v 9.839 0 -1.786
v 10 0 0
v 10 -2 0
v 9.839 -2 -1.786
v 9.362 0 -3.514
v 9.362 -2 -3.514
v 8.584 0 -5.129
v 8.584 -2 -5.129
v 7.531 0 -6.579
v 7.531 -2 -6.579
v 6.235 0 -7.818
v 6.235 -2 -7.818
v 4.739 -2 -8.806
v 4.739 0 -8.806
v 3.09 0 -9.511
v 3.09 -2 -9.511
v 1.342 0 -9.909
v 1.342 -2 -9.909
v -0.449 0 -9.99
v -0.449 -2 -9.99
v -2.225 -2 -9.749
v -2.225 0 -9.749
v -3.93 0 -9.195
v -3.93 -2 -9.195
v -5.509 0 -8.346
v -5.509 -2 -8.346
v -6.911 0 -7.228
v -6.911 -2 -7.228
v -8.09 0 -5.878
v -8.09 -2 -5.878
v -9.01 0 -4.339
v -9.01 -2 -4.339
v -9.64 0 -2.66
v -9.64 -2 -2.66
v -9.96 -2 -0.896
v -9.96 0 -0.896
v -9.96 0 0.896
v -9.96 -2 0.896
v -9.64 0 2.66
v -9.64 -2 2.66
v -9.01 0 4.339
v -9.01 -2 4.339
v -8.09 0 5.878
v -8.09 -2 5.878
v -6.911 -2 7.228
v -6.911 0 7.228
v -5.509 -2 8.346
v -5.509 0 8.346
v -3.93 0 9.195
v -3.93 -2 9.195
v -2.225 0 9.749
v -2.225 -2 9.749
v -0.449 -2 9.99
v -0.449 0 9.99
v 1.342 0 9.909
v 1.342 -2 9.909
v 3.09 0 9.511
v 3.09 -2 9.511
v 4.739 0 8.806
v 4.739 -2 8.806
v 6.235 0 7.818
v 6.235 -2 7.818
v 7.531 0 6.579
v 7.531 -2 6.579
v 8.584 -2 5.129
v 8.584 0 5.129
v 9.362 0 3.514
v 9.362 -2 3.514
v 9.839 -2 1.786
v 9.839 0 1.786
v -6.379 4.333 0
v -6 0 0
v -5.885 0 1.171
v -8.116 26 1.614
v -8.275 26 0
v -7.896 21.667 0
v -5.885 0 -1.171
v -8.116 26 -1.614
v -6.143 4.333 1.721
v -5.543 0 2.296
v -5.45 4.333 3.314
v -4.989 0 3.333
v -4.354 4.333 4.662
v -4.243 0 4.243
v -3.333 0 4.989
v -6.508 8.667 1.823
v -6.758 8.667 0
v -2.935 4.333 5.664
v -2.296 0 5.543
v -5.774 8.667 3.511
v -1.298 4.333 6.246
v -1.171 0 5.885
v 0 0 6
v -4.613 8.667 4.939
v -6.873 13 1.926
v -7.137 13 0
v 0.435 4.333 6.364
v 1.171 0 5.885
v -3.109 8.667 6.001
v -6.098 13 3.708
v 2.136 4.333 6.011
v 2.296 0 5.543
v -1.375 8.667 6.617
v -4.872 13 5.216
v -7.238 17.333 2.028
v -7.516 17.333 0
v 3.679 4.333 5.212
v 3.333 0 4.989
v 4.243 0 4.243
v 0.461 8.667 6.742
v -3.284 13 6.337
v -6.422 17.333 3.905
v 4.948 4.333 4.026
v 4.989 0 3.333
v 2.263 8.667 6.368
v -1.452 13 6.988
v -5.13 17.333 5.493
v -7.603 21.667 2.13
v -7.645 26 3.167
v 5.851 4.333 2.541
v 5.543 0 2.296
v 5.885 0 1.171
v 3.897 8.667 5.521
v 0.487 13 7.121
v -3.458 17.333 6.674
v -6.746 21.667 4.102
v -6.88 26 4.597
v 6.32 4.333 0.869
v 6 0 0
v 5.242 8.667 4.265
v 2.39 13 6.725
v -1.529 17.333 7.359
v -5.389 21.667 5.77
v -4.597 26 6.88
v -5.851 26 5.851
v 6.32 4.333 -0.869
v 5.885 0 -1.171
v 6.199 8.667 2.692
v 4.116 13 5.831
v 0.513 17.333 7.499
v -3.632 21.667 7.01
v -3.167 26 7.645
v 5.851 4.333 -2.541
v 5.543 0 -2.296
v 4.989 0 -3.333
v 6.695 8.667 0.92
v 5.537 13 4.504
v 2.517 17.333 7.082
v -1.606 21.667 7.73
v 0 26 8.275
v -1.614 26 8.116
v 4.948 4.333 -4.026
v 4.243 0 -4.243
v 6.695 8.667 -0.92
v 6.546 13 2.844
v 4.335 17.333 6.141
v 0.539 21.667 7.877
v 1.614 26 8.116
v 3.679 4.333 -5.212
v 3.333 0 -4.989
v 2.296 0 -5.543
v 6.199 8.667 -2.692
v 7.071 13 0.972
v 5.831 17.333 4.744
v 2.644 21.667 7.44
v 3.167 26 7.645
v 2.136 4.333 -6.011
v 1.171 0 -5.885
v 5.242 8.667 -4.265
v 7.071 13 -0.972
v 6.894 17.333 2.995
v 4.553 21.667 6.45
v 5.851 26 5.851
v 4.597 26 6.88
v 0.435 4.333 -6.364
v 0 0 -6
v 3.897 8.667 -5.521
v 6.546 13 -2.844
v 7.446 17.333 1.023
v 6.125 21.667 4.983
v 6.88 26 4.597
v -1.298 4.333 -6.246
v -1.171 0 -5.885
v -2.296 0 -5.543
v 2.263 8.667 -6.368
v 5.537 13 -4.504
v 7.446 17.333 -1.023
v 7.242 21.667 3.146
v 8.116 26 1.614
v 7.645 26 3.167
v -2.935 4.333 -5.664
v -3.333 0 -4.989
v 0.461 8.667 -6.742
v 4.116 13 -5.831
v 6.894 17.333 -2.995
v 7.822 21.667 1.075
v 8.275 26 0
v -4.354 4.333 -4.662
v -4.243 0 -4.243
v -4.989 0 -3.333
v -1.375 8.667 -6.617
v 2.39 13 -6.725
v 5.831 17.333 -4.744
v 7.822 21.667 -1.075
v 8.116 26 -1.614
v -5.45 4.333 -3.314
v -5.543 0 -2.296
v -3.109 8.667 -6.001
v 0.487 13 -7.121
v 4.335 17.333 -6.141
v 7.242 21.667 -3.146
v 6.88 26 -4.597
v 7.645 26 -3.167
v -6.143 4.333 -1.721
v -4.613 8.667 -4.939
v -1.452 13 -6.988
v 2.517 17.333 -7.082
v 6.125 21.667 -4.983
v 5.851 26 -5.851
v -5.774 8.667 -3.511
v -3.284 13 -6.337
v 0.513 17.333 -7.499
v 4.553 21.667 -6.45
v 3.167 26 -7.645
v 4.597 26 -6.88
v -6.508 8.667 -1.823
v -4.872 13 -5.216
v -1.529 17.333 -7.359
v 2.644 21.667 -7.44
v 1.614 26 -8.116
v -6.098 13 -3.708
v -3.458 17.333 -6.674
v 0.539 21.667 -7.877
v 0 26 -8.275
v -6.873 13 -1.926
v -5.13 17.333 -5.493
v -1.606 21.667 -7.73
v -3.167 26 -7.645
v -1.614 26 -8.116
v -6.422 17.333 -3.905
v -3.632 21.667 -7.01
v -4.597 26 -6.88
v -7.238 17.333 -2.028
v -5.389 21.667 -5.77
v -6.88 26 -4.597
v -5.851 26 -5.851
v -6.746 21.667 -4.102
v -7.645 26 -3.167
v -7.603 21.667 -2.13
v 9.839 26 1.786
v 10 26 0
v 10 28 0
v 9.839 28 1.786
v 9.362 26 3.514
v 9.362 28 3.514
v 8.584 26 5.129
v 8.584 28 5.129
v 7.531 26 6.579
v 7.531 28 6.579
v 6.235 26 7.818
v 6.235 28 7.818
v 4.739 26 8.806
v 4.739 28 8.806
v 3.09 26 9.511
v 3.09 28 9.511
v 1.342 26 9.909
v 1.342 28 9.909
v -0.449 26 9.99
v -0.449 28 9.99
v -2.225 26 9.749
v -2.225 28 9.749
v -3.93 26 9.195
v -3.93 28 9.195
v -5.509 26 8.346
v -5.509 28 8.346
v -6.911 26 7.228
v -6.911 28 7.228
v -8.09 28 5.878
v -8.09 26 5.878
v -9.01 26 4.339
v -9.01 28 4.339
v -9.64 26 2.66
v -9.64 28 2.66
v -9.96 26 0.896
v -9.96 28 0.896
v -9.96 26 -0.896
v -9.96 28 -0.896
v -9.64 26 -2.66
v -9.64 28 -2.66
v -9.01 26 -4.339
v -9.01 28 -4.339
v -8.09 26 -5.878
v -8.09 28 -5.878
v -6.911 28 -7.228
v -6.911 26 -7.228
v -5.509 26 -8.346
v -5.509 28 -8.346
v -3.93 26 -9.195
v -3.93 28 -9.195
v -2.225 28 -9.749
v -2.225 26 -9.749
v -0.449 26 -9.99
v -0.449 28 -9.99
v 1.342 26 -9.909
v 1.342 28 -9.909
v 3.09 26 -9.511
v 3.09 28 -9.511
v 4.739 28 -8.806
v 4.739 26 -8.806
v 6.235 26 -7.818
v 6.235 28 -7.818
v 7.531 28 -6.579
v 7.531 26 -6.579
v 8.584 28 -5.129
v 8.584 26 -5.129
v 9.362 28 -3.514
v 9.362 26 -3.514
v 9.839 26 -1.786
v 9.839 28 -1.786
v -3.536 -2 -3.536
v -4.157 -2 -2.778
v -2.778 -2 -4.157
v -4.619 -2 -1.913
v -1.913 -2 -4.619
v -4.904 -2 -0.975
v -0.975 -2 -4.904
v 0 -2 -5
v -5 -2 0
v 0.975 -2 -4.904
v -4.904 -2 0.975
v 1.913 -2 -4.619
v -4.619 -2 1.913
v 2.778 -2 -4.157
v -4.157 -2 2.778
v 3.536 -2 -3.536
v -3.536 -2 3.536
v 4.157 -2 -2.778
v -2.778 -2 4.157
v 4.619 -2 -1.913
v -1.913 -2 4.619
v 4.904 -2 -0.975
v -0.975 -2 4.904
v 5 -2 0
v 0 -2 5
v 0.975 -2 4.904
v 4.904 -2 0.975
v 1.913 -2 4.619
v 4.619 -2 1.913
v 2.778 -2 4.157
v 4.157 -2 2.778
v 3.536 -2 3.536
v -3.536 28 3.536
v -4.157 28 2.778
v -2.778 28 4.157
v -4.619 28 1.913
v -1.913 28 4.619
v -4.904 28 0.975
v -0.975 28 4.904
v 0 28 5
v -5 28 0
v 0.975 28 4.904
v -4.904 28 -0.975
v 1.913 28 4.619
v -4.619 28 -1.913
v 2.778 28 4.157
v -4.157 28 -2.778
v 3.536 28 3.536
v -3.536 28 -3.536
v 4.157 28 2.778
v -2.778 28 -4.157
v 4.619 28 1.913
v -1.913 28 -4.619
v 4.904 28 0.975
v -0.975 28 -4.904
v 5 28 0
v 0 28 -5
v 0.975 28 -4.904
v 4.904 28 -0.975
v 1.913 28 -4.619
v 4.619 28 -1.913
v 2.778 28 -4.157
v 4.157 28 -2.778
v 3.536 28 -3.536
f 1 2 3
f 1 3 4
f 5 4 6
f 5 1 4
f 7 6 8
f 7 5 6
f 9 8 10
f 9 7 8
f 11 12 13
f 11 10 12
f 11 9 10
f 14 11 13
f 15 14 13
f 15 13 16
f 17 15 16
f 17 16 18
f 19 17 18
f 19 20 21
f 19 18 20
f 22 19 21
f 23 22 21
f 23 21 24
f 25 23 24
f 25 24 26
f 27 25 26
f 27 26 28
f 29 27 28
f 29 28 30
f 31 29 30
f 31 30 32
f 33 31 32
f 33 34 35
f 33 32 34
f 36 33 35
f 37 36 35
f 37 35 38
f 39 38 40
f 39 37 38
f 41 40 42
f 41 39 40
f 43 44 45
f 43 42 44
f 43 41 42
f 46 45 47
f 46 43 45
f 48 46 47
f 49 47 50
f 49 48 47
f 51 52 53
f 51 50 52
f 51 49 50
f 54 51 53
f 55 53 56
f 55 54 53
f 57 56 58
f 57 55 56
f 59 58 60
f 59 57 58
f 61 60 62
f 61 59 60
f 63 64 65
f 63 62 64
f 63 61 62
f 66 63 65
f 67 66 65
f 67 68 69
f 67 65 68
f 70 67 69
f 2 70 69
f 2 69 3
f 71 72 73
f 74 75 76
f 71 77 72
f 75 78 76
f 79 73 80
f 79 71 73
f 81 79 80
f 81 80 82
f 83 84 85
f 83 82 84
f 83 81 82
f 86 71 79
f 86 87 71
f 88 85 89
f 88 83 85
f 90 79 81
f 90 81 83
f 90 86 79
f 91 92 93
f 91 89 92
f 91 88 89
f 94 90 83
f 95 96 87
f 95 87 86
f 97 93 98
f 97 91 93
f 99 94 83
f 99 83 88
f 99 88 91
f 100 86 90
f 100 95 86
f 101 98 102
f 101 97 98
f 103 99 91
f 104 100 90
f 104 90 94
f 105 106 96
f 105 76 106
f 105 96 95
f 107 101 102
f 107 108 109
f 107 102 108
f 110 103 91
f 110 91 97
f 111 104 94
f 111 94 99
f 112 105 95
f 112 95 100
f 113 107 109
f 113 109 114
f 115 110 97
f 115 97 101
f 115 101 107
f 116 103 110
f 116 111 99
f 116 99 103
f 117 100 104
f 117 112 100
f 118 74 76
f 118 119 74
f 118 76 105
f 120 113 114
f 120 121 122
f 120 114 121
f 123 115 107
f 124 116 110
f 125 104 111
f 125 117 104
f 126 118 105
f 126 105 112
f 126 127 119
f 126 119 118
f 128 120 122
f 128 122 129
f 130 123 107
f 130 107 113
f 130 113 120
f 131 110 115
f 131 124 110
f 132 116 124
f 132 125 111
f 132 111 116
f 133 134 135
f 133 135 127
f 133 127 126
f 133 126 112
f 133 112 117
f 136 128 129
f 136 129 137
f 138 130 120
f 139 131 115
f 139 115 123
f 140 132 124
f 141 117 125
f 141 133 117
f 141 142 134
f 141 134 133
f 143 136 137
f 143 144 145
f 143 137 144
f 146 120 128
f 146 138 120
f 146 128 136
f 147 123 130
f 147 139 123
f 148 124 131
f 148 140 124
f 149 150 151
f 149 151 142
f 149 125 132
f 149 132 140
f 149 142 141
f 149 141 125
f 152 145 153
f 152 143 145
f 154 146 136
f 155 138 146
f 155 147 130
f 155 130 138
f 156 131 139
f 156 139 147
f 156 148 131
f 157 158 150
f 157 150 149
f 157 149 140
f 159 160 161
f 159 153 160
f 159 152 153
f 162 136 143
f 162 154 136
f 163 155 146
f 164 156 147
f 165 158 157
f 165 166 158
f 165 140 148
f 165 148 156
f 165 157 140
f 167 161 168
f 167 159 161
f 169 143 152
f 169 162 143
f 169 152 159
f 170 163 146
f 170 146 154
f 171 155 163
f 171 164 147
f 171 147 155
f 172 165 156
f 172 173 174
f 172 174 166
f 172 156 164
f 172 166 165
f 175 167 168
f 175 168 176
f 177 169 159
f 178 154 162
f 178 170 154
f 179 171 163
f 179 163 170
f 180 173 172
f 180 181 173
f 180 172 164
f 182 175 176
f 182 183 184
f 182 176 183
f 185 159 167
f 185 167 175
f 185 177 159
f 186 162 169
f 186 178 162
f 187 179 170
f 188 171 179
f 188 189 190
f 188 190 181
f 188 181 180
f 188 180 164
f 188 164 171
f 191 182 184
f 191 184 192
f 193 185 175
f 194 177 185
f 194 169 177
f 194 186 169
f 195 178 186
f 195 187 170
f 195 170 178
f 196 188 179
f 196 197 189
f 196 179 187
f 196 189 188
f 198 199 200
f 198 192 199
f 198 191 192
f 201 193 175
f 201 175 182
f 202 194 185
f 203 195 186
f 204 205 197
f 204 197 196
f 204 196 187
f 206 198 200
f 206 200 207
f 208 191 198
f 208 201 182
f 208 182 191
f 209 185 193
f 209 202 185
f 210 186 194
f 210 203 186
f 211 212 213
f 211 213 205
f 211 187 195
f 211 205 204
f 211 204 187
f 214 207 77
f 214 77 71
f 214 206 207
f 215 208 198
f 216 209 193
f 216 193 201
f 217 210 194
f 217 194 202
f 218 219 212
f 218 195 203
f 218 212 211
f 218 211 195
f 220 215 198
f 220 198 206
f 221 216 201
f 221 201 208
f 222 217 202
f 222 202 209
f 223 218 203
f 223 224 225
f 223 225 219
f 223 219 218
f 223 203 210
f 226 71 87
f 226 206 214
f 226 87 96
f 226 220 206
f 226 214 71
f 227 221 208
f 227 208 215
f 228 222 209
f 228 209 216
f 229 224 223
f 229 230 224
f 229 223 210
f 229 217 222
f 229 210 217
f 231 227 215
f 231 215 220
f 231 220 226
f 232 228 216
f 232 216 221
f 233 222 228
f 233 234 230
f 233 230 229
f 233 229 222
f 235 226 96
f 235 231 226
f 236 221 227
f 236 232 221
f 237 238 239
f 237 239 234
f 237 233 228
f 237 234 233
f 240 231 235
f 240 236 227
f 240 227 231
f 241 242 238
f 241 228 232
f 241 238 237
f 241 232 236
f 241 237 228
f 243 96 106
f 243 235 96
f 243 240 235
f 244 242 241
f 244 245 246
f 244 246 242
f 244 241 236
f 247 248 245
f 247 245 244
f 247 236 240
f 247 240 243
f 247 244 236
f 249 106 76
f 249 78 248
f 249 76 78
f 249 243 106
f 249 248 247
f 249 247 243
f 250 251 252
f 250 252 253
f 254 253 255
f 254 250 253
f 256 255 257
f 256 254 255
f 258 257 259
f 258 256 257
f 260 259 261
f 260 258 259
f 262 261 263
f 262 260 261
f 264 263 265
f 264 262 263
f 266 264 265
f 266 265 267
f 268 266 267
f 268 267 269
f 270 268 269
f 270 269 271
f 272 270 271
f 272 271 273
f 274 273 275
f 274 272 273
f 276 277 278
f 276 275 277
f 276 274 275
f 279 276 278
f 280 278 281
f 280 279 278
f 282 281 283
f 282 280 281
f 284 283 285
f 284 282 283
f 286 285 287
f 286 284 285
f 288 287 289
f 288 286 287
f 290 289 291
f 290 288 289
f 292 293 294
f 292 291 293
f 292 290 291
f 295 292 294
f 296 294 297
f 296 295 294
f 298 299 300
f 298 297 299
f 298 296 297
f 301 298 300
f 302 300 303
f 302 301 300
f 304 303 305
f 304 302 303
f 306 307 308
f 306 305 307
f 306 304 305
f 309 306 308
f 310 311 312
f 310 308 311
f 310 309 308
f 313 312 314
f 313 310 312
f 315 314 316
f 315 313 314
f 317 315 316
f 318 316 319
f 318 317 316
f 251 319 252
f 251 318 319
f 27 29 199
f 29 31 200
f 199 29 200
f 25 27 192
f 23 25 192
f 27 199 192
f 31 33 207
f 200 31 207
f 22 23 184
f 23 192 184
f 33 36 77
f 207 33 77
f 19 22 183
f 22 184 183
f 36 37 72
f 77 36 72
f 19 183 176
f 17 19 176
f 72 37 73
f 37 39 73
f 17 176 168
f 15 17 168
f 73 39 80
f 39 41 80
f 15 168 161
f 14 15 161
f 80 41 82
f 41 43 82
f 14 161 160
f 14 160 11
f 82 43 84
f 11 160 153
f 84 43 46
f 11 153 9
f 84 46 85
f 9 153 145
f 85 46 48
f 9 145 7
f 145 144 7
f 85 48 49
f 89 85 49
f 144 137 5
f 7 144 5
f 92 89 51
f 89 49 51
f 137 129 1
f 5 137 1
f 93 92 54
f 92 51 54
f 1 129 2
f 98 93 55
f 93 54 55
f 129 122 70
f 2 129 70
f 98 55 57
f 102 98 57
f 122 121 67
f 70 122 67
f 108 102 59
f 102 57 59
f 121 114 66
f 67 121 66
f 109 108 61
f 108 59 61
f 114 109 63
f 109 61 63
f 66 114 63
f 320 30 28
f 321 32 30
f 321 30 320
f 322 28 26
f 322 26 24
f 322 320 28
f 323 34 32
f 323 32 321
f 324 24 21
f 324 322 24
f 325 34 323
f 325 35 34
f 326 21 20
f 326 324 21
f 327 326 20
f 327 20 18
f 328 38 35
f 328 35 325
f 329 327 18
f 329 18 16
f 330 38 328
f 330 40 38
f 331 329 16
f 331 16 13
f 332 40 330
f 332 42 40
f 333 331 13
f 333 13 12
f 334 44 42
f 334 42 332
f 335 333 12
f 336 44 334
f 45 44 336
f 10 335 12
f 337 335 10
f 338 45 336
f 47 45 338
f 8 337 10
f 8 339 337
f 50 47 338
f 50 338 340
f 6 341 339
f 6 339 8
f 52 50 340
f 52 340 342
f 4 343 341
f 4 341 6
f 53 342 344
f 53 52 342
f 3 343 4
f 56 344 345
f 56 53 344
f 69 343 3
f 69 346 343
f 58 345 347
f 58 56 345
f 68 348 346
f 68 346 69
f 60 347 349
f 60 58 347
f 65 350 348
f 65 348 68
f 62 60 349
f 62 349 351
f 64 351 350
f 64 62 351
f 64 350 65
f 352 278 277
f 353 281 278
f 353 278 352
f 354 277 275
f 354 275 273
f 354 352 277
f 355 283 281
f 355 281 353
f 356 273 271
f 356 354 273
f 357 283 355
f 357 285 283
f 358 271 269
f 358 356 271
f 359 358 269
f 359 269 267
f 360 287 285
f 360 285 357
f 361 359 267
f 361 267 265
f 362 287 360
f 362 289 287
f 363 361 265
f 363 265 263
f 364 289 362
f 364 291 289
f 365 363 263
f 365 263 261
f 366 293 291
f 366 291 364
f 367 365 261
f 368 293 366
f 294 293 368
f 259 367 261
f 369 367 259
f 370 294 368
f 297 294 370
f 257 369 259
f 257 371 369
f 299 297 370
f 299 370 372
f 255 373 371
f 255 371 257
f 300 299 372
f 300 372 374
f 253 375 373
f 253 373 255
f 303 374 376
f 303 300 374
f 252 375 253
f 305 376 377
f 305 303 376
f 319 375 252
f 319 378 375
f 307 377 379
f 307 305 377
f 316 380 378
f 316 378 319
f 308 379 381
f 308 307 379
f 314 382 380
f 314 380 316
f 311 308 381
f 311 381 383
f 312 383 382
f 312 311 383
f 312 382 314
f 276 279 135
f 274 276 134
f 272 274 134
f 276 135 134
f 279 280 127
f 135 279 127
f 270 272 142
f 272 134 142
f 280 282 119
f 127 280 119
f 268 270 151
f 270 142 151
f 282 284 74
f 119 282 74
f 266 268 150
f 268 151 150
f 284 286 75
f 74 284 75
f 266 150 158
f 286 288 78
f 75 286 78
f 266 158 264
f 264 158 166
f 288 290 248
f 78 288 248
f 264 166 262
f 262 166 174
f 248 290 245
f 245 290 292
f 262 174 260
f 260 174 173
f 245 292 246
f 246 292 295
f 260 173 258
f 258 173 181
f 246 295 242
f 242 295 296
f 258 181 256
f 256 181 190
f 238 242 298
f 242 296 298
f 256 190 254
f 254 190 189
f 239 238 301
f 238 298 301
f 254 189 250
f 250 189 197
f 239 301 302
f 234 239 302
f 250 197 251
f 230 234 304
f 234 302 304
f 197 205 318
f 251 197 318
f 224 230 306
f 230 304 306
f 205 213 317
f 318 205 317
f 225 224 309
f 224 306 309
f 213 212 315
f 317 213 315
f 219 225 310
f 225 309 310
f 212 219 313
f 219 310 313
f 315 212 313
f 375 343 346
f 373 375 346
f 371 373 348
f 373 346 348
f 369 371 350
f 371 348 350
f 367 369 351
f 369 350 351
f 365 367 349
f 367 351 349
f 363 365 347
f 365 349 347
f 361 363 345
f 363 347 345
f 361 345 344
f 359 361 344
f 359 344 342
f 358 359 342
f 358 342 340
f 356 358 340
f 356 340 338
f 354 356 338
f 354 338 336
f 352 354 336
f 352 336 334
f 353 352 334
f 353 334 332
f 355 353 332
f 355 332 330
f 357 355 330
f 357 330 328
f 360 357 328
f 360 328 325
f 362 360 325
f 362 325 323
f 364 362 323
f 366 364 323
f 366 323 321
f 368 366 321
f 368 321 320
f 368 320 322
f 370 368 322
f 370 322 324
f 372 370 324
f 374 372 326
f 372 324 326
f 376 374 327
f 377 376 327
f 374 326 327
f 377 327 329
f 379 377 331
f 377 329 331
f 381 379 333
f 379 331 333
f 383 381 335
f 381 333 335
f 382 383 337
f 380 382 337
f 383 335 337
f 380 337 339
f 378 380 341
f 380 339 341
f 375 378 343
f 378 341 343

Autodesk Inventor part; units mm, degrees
ref_plane "YZ Plane" through (0, 0, 0) normal (1, 0, 0) x (0, 1, 0)
ref_plane "XZ Plane" through (0, 0, 0) normal (0, 1, 0) x (-1, 0, 0)
ref_plane "XY Plane" through (0, 0, 0) normal (0, 0, 1) x (1, 0, 0)
sketch "草图1" plane through (0, 0, 0) normal (0, 1, 0) x (-1, 0, 0)
  circle A0 centre (0, 0) radius 6
  dimension "带轮直径" = 12
extrude "拉伸2" add sketch "草图1" along normal blind 26 draft 5
sketch "草图3" plane through (0, 0, 0) normal (0, -1, 0) x (1, 0, 0)
  circle A0 centre (0, 0) radius 10
  dimension "外径" = 20
sketch "草图4" plane through (0, 26, 0) normal (0, 1, 0) x (1, 0, 0)
  circle A0 centre (0, 0) radius 10
  dimension "d12" = 20
extrude "拉伸4" add sketch "草图3" along normal blind 2
extrude "拉伸5" add sketch "草图4" along normal blind 2
sketch "草图2" plane through (0, 0, 0) normal (0, -1, 0) x (1, 0, 0)
  circle A0 centre (0, 0) radius 5
  dimension "孔径" = 10
extrude "拉伸3" cut sketch "草图2" along normal through all both and the other way through all
equation "\"d12\" = 外径"
equation "\"d15\" = 外圆"
equation "\"外圆\" = 2"
properties part number "带轮" material "木材(桦木)"
